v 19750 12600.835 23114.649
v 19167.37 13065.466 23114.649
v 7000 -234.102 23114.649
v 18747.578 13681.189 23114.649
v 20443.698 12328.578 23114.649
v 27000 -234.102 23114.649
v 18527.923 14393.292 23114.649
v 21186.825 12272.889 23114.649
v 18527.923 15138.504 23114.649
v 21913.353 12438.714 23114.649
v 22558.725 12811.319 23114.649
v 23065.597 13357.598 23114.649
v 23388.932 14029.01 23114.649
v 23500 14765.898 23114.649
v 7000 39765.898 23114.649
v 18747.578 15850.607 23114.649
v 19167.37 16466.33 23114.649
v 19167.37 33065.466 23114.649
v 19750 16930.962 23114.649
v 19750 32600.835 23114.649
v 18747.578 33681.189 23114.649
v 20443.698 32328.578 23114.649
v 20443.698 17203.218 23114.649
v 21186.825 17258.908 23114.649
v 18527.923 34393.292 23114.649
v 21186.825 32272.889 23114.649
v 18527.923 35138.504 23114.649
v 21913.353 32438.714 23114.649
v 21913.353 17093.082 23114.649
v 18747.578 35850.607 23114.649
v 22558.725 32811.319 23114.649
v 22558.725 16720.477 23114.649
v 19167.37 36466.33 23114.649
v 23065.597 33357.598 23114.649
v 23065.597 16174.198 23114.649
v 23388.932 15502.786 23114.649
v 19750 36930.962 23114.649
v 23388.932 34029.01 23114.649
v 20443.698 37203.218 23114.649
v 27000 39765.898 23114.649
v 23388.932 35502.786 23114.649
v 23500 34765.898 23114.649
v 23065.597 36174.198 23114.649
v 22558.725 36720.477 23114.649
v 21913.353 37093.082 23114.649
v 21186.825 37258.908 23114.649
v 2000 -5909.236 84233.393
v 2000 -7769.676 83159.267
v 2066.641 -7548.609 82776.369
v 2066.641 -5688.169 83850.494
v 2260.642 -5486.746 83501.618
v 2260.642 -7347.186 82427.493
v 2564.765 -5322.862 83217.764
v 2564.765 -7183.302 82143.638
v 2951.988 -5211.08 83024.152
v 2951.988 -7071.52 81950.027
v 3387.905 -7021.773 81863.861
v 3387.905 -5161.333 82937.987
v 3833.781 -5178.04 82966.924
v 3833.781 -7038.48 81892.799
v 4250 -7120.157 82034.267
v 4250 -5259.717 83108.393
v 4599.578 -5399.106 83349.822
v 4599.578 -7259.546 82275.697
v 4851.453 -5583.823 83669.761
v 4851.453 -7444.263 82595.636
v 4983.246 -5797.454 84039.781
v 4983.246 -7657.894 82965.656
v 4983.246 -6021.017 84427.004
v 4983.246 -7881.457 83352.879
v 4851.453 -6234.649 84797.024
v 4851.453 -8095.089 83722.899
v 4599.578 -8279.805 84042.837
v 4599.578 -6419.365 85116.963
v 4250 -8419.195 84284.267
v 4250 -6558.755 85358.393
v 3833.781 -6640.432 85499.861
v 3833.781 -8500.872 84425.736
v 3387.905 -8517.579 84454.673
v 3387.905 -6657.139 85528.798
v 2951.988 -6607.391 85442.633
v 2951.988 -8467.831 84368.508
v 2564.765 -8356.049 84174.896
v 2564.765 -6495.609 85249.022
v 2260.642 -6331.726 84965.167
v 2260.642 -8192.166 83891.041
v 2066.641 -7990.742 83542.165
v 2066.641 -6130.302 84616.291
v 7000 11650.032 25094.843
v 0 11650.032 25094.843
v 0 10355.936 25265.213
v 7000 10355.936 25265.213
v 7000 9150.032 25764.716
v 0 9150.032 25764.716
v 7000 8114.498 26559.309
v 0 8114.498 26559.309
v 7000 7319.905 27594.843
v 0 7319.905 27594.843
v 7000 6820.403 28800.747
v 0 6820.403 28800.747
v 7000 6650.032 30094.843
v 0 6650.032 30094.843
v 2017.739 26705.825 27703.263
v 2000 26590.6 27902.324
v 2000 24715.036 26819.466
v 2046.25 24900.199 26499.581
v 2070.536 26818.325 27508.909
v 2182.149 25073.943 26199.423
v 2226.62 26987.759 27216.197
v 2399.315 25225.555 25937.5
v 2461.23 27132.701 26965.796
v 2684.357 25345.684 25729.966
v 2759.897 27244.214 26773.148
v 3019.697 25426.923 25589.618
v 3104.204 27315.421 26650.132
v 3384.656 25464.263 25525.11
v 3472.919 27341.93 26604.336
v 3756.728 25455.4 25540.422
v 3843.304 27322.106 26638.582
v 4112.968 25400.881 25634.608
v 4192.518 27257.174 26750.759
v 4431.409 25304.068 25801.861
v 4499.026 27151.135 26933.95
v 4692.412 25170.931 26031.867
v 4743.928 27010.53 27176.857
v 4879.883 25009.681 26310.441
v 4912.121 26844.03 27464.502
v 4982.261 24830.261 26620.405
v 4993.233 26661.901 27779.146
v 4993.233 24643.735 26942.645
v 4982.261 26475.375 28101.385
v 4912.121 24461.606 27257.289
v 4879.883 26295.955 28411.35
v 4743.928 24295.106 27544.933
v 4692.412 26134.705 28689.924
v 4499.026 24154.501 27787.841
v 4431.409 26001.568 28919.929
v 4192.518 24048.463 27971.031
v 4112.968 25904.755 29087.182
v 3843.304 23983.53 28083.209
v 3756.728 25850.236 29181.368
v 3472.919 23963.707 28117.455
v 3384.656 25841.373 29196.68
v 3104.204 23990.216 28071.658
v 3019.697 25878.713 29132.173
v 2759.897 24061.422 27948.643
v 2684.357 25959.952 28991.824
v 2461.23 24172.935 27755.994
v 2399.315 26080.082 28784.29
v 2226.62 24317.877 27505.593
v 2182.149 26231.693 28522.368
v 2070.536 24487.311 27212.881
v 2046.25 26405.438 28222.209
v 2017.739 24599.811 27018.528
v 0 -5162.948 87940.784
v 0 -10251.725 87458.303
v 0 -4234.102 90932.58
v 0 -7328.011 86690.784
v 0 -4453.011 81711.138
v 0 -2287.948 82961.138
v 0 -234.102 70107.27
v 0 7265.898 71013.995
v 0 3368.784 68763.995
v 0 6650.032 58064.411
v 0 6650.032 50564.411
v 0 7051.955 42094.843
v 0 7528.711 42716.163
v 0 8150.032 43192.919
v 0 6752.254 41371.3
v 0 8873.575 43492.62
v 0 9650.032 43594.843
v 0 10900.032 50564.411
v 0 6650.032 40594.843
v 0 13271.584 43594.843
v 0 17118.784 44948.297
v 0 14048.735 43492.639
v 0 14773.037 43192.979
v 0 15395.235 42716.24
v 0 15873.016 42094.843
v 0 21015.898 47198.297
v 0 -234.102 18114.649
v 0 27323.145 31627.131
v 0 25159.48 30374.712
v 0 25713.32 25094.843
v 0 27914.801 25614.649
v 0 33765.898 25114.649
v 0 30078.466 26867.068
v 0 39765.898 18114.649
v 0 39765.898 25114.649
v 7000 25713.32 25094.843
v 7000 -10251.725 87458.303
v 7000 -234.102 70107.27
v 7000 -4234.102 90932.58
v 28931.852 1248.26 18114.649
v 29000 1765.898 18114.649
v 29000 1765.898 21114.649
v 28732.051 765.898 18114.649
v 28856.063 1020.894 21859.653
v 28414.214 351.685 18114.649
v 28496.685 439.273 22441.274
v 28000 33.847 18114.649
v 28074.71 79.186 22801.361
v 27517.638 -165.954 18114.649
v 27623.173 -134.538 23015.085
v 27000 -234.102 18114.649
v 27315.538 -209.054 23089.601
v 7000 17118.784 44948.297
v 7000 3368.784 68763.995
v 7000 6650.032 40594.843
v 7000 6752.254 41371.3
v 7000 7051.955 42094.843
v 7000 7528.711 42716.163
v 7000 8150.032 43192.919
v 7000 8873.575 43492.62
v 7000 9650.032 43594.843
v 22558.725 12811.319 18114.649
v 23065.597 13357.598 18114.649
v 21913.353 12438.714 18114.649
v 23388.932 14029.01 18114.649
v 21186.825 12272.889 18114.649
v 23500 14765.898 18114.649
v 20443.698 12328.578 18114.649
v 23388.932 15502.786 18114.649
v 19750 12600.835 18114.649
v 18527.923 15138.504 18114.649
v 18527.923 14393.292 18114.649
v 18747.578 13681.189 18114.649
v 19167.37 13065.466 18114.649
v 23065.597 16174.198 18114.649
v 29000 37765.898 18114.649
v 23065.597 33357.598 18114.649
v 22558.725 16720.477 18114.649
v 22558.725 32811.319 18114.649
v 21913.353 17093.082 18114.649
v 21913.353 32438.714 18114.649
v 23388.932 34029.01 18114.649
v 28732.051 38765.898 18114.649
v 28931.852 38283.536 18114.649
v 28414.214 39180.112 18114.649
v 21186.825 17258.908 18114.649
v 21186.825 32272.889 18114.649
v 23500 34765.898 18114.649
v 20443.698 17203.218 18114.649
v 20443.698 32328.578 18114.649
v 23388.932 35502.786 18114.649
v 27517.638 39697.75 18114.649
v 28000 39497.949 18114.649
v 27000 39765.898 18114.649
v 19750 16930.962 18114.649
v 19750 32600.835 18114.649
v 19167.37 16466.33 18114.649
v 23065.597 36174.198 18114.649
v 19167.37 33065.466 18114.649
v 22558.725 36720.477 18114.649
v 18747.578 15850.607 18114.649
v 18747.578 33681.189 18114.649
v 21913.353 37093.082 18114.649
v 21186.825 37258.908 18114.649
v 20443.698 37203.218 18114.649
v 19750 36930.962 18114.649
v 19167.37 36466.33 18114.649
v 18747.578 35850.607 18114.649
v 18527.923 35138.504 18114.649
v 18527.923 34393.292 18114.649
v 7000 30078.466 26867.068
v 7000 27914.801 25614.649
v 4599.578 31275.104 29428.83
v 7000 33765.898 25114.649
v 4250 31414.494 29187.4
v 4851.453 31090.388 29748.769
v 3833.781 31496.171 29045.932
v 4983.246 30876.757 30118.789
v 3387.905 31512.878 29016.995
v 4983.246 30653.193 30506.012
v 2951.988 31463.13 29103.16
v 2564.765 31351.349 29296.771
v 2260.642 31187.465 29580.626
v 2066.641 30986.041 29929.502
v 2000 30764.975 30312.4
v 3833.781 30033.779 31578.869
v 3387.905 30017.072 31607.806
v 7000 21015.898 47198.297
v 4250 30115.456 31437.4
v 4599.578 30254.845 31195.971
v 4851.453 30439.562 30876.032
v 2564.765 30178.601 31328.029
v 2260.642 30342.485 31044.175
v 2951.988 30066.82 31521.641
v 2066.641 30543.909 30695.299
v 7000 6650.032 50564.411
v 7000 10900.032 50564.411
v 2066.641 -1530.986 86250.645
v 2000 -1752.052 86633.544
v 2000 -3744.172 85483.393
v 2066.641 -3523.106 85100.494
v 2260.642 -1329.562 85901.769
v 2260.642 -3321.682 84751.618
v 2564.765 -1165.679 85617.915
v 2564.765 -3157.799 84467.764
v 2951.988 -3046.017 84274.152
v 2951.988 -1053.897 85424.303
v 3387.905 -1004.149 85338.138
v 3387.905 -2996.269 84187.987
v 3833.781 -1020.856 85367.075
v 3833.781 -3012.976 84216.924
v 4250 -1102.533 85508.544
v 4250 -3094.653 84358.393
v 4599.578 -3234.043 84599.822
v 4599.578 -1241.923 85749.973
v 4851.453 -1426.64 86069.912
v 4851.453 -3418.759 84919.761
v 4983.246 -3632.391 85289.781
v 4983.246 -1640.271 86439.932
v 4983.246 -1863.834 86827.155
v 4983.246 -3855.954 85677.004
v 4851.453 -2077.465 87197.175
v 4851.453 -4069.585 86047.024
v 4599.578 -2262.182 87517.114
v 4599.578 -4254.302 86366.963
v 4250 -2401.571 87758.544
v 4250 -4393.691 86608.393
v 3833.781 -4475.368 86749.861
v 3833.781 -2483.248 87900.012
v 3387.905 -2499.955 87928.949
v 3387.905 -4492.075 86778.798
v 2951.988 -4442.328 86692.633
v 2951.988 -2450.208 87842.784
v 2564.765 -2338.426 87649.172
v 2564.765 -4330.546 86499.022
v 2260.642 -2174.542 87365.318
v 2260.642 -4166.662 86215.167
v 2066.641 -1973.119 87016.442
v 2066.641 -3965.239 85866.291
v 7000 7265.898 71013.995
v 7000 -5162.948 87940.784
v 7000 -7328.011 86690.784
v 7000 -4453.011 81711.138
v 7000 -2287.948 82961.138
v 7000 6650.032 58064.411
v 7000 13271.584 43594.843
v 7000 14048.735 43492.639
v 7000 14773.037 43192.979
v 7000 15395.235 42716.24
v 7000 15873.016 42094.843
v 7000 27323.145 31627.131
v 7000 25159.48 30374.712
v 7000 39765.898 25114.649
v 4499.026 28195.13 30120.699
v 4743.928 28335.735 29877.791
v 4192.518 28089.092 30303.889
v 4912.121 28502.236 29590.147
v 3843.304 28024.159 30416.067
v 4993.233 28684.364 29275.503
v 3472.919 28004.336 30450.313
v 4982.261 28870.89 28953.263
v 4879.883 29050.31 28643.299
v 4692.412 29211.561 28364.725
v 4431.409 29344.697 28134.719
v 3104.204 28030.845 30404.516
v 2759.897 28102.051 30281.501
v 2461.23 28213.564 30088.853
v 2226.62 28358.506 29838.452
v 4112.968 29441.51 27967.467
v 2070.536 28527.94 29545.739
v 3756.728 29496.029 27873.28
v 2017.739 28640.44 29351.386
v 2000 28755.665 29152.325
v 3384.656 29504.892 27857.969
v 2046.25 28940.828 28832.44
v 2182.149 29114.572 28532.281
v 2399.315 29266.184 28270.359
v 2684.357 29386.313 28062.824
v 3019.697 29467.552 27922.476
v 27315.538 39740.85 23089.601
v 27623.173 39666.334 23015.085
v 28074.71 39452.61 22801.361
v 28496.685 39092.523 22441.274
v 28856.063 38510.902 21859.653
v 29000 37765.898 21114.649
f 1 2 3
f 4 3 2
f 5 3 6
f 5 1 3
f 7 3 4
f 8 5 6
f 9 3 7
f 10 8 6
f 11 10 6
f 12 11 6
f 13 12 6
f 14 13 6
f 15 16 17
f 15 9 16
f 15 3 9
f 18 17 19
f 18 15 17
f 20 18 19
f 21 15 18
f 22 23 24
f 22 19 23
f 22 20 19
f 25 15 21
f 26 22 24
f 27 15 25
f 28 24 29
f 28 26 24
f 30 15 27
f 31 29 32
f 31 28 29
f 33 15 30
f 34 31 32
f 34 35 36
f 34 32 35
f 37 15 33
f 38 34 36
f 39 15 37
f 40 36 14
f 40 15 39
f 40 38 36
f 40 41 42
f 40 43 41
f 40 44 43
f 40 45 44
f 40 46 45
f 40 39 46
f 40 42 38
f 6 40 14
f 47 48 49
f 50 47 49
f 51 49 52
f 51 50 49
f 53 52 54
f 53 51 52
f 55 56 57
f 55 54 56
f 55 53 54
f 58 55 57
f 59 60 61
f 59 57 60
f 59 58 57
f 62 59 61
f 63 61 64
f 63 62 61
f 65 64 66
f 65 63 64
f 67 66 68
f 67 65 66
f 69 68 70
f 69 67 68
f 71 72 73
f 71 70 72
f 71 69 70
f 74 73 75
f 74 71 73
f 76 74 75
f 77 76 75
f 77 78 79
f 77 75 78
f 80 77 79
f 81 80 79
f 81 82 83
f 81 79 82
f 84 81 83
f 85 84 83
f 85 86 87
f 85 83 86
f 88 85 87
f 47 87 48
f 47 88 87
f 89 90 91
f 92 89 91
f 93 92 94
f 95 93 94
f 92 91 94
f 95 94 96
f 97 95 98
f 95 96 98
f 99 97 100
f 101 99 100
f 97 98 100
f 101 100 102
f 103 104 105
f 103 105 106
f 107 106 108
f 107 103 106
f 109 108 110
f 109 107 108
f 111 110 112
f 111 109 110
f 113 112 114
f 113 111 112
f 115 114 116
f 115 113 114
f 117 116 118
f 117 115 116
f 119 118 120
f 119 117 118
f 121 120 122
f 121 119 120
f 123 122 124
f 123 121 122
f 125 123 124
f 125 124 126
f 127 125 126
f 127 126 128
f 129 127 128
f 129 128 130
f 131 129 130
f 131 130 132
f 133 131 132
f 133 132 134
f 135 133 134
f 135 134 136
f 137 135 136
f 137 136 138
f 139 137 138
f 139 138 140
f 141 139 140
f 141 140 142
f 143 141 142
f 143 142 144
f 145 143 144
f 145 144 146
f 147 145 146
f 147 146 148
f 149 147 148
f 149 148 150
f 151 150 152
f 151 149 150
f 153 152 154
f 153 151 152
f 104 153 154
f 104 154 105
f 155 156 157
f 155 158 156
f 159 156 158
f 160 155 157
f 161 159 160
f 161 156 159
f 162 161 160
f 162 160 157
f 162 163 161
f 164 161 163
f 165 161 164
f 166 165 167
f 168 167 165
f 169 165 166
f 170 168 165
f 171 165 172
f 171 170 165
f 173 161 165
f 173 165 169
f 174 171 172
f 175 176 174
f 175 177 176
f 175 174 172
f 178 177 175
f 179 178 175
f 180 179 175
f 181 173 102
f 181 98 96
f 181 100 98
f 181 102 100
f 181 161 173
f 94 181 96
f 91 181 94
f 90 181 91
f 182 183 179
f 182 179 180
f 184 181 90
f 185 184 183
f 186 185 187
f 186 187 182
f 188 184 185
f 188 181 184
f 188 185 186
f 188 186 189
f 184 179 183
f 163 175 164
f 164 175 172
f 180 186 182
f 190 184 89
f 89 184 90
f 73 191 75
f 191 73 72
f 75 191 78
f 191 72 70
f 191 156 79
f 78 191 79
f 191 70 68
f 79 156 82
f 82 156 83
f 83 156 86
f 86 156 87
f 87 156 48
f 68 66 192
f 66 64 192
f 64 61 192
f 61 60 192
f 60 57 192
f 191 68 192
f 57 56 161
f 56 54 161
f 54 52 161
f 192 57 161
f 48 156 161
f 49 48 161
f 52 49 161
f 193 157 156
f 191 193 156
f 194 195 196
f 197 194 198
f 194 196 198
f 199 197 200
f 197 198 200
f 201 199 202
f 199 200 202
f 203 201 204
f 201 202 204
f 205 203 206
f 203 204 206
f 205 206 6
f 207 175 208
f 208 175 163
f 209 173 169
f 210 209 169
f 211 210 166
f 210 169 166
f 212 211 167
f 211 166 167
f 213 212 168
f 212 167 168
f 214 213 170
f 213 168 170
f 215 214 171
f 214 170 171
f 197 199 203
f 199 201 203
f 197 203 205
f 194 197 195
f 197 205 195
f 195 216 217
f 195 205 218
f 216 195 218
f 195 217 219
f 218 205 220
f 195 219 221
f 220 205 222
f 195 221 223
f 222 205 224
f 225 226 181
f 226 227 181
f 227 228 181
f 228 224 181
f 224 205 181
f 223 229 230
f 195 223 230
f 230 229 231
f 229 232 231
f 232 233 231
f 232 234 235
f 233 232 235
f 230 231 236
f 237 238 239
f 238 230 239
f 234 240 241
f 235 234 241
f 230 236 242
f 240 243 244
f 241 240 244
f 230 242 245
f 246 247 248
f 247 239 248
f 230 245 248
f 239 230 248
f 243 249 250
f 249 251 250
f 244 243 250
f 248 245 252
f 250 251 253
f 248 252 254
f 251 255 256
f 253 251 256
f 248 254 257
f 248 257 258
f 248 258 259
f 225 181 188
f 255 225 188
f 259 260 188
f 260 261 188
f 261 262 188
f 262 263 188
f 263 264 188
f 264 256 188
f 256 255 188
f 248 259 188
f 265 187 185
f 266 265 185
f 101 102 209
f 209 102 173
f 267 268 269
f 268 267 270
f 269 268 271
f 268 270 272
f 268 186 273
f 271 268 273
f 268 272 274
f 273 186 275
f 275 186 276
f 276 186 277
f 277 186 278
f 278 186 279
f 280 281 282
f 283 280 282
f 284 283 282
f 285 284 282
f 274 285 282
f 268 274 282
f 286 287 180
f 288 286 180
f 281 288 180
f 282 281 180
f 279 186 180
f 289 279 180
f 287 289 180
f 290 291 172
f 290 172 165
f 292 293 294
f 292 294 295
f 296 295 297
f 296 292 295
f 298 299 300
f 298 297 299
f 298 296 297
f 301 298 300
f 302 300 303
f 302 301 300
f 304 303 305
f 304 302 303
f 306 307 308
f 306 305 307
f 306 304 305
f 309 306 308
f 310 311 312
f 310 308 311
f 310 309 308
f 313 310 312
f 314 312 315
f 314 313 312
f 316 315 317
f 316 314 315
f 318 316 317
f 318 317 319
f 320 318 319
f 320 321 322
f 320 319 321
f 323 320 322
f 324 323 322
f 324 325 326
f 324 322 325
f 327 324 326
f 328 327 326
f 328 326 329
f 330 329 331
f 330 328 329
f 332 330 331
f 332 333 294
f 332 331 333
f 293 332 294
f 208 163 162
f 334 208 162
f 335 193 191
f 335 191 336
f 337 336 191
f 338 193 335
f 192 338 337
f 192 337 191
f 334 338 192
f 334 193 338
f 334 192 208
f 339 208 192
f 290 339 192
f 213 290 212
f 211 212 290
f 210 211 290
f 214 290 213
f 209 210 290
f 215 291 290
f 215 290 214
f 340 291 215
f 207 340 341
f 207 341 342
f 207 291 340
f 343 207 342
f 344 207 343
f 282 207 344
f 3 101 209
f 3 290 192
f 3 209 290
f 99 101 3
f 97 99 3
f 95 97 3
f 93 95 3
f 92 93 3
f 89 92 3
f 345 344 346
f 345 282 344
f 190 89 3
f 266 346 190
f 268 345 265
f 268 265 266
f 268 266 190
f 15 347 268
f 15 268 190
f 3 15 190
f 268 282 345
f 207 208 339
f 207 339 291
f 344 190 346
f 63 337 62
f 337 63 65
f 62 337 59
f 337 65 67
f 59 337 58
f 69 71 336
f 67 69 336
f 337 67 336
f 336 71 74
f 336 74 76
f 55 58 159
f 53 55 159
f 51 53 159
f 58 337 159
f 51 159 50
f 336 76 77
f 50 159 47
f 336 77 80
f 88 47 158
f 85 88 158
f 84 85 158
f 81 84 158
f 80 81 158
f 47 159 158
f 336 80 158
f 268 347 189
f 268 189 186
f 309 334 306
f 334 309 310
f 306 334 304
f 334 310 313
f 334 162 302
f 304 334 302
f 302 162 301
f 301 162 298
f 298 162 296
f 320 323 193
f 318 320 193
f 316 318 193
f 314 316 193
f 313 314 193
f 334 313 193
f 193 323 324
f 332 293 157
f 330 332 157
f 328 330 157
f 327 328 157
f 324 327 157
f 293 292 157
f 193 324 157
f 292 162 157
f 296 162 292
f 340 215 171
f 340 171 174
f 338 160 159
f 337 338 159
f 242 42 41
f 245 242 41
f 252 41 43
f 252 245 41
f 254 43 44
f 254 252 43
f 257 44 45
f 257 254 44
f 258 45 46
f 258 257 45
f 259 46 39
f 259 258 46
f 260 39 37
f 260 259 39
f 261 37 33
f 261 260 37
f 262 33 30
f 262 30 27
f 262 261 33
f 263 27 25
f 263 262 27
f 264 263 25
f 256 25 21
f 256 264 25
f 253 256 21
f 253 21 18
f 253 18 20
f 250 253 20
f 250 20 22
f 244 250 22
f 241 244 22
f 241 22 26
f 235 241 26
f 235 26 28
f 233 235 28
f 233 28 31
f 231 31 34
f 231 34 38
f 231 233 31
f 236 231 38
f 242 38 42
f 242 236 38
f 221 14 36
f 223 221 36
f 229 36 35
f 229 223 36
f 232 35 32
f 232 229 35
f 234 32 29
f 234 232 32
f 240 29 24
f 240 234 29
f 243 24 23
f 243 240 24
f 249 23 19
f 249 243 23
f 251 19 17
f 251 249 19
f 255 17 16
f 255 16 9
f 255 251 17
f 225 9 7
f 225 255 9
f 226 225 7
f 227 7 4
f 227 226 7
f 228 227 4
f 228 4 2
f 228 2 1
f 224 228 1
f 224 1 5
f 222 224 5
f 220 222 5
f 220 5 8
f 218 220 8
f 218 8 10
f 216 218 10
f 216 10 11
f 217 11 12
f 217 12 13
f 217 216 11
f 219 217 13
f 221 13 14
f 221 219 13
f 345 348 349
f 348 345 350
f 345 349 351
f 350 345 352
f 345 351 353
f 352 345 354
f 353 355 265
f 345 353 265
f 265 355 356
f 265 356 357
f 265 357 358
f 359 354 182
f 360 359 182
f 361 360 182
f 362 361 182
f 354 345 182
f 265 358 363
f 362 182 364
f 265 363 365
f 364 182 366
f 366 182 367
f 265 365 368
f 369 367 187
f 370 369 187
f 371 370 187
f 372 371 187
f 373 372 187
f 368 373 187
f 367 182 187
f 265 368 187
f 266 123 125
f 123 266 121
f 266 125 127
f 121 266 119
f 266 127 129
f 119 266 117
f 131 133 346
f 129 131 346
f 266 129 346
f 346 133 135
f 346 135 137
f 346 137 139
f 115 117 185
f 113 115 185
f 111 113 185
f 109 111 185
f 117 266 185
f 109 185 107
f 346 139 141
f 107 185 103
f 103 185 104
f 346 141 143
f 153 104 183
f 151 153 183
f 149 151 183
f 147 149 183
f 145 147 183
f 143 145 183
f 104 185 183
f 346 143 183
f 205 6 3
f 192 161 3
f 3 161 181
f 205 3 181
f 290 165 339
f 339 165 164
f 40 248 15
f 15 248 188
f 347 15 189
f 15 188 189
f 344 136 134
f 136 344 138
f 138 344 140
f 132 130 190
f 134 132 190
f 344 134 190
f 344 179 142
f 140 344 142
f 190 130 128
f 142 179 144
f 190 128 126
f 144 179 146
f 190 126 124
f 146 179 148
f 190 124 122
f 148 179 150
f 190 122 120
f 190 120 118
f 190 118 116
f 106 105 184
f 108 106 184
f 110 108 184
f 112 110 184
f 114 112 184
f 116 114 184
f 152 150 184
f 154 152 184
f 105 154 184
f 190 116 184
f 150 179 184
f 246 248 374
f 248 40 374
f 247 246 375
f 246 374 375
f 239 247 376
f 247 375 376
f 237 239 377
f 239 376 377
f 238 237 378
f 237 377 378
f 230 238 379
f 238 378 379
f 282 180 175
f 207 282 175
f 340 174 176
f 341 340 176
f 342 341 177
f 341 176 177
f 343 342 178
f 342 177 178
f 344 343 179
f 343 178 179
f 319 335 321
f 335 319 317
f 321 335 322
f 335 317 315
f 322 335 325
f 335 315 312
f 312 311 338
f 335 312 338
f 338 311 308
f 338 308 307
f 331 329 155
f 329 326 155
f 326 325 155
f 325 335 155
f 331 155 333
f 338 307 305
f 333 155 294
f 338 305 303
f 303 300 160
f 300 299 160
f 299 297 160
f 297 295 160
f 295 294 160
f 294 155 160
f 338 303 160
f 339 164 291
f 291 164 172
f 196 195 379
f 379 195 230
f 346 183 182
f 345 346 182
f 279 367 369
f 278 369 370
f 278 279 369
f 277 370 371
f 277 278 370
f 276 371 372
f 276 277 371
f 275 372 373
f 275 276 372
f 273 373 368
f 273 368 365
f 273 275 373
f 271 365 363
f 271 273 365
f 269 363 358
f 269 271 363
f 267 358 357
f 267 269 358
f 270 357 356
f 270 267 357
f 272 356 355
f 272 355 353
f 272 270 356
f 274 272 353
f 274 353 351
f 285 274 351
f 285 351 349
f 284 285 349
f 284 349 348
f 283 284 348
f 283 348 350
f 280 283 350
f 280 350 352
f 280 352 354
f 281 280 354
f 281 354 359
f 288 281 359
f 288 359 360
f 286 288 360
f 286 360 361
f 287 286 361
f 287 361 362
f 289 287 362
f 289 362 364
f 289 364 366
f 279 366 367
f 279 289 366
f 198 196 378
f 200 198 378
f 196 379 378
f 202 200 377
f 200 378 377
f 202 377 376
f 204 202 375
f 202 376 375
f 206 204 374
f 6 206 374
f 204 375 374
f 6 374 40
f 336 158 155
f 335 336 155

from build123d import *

# Parameters (mm, degrees)
BOSS_EXTRUDE1_DEPTH  = 7000
SKETCH8_W            = 29000
SKETCH8_H            = 40000
SKETCH8_R            = 2500
BOSS_EXTRUDE3_DEPTH  = 5000
FILLET1_R            = 2000
SKETCH9_R            = 1500
CUT_EXTRUDE1_DEPTH   = 7500
FILLET1_OF_MIRROR1_R = 2000
SKETCH10_W           = 30032.748500045
SKETCH10_H           = 50017.623394931
SKETCH10_W_2         = 1774.573147716
SKETCH10_H_2         = 4942.399092914
CUT_EXTRUDE2_DEPTH   = 72818.930687617


with BuildPart() as part:
    # Sketch1 → Boss-Extrude1 (new body)
    with BuildSketch(Plane(origin=(0, 0, 0), x_dir=(0, 0, -1), z_dir=(1, 0, 0))):
        Polygon((-71013.995318758, 7265.898072848), (-90932.579605801, -4234.101927152), (-87458.303118855, -10251.725322083), (-70107.270427744, -234.101927152), (-18114.648918183, -234.101927152), (-18114.648918183, 39765.898072848), (-25114.648918183, 39765.898072848), (-25114.648918183, 33765.898072848), (-47198.296714686, 21015.898072848), (-44948.296714686, 17118.783755818), (-68763.995318758, 3368.783755818), align=None)
        Polygon((-86690.784266902, -7328.011455498), (-87940.784266902, -5162.947946037), (-82961.138195142, -2287.947946037), (-81711.138195142, -4453.011455498), align=None, mode=Mode.SUBTRACT)
        Polygon((-50564.411297588, 6650.031696168), (-58064.411297588, 6650.031696168), (-50564.411297588, 10900.031696168), align=None, mode=Mode.SUBTRACT)
        with BuildLine():
            Line((-42094.842589731, 15873.015861461), (-25094.842589731, 25713.319742243))
            Line((-25094.842589731, 25713.319742243), (-25094.842589731, 11650.031696168))
            ThreePointArc((-25094.842589731, 11650.031696168), (-26559.308683798, 8114.497790235), (-30094.842589731, 6650.031696168))
            Line((-30094.842589731, 6650.031696168), (-40594.842589731, 6650.031696168))
            ThreePointArc((-40594.842589731, 6650.031696168), (-42716.16293329, 7528.711352608), (-43594.842589731, 9650.031696168))
            Line((-43594.842589731, 9650.031696168), (-43594.842589731, 13271.583512645))
            ThreePointArc((-43594.842589731, 13271.583512645), (-43192.9789446, 14773.036997228), (-42094.842589731, 15873.015861461))
        make_face(mode=Mode.SUBTRACT)
        Polygon((-30374.7121835, 25159.479548575), (-31627.131141319, 27323.144669173), (-26867.067876003, 30078.466376377), (-25614.648918183, 27914.801255779), align=None, mode=Mode.SUBTRACT)
    boss_extrude1 = extrude(amount=-BOSS_EXTRUDE1_DEPTH)

    # Sketch8 → Boss-Extrude3 (add)
    with BuildSketch(Plane(origin=(0, 0, 18114.648918183), x_dir=(-1, 0, 0), z_dir=(0, 0, -1))):
        with Locations((14500, 19765.898072848)):
            Rectangle(SKETCH8_W, SKETCH8_H)
        with Locations((21000, 14765.898072848)):
            Circle(SKETCH8_R, mode=Mode.SUBTRACT)
        with Locations((21000, 34765.898072848)):
            Circle(SKETCH8_R, mode=Mode.SUBTRACT)
    boss_extrude3 = extrude(amount=-BOSS_EXTRUDE3_DEPTH)

    # Fillet1
    fillet1_edges = [part.edges().sort_by_distance(p)[0] for p in [
        (-29000, -234.101927152, 20614.648918183),
        (-29000, 19765.898072848, 23114.648918183),
        (-29000, 39765.898072848, 20614.648918183),
    ]]
    fillet(fillet1_edges, radius=FILLET1_R)

    # Sketch9 → Cut-Extrude1 (cut)
    with BuildSketch(Plane(origin=(0, 36199.385539773, 20899.724985887), x_dir=(1, 0, 0), z_dir=(0, 0.866025404, 0.5))):
        with Locations((-3500, -10868.821249998)):
            Circle(SKETCH9_R)
        with Locations((-3500, -75902.875745792)):
            Circle(SKETCH9_R)
    cut_extrude1 = extrude(amount=-CUT_EXTRUDE1_DEPTH, mode=Mode.SUBTRACT)

    # Mirror1: Boss-Extrude1, Boss-Extrude3, Cut-Extrude1 across plane
    add(boss_extrude1.mirror(Plane(origin=(0, 0, 0), x_dir=(0, 0, 1), z_dir=(1, 0, 0))))
    add(boss_extrude3.mirror(Plane(origin=(0, 0, 0), x_dir=(0, 0, 1), z_dir=(1, 0, 0))))
    add(cut_extrude1.mirror(Plane(origin=(0, 0, 0), x_dir=(0, 0, 1), z_dir=(1, 0, 0))), mode=Mode.SUBTRACT)

    # Fillet1 of Mirror1
    fillet1_of_mirror1_edges = [part.edges().sort_by_distance(p)[0] for p in [
        (29000, -234.101927152, 20614.648918183),
        (29000, 19765.898072848, 23114.648918183),
        (29000, 39765.898072848, 20614.648918183),
    ]]
    fillet(fillet1_of_mirror1_edges, radius=FILLET1_OF_MIRROR1_R)

    # Sketch10 → Cut-Extrude2 (cut, through all)
    with BuildSketch(Plane(origin=(0, 0, 18114.648918183), x_dir=(-1, 0, 0), z_dir=(0, 0, -1))):
        with Locations((15016.374250023, 14757.086375382)):
            Rectangle(SKETCH10_W, SKETCH10_H)
        with Locations((35320.938179735, 37487.521083943)):
            Rectangle(SKETCH10_W_2, SKETCH10_H_2)
    extrude(amount=-CUT_EXTRUDE2_DEPTH, mode=Mode.SUBTRACT)


solid = part.part
